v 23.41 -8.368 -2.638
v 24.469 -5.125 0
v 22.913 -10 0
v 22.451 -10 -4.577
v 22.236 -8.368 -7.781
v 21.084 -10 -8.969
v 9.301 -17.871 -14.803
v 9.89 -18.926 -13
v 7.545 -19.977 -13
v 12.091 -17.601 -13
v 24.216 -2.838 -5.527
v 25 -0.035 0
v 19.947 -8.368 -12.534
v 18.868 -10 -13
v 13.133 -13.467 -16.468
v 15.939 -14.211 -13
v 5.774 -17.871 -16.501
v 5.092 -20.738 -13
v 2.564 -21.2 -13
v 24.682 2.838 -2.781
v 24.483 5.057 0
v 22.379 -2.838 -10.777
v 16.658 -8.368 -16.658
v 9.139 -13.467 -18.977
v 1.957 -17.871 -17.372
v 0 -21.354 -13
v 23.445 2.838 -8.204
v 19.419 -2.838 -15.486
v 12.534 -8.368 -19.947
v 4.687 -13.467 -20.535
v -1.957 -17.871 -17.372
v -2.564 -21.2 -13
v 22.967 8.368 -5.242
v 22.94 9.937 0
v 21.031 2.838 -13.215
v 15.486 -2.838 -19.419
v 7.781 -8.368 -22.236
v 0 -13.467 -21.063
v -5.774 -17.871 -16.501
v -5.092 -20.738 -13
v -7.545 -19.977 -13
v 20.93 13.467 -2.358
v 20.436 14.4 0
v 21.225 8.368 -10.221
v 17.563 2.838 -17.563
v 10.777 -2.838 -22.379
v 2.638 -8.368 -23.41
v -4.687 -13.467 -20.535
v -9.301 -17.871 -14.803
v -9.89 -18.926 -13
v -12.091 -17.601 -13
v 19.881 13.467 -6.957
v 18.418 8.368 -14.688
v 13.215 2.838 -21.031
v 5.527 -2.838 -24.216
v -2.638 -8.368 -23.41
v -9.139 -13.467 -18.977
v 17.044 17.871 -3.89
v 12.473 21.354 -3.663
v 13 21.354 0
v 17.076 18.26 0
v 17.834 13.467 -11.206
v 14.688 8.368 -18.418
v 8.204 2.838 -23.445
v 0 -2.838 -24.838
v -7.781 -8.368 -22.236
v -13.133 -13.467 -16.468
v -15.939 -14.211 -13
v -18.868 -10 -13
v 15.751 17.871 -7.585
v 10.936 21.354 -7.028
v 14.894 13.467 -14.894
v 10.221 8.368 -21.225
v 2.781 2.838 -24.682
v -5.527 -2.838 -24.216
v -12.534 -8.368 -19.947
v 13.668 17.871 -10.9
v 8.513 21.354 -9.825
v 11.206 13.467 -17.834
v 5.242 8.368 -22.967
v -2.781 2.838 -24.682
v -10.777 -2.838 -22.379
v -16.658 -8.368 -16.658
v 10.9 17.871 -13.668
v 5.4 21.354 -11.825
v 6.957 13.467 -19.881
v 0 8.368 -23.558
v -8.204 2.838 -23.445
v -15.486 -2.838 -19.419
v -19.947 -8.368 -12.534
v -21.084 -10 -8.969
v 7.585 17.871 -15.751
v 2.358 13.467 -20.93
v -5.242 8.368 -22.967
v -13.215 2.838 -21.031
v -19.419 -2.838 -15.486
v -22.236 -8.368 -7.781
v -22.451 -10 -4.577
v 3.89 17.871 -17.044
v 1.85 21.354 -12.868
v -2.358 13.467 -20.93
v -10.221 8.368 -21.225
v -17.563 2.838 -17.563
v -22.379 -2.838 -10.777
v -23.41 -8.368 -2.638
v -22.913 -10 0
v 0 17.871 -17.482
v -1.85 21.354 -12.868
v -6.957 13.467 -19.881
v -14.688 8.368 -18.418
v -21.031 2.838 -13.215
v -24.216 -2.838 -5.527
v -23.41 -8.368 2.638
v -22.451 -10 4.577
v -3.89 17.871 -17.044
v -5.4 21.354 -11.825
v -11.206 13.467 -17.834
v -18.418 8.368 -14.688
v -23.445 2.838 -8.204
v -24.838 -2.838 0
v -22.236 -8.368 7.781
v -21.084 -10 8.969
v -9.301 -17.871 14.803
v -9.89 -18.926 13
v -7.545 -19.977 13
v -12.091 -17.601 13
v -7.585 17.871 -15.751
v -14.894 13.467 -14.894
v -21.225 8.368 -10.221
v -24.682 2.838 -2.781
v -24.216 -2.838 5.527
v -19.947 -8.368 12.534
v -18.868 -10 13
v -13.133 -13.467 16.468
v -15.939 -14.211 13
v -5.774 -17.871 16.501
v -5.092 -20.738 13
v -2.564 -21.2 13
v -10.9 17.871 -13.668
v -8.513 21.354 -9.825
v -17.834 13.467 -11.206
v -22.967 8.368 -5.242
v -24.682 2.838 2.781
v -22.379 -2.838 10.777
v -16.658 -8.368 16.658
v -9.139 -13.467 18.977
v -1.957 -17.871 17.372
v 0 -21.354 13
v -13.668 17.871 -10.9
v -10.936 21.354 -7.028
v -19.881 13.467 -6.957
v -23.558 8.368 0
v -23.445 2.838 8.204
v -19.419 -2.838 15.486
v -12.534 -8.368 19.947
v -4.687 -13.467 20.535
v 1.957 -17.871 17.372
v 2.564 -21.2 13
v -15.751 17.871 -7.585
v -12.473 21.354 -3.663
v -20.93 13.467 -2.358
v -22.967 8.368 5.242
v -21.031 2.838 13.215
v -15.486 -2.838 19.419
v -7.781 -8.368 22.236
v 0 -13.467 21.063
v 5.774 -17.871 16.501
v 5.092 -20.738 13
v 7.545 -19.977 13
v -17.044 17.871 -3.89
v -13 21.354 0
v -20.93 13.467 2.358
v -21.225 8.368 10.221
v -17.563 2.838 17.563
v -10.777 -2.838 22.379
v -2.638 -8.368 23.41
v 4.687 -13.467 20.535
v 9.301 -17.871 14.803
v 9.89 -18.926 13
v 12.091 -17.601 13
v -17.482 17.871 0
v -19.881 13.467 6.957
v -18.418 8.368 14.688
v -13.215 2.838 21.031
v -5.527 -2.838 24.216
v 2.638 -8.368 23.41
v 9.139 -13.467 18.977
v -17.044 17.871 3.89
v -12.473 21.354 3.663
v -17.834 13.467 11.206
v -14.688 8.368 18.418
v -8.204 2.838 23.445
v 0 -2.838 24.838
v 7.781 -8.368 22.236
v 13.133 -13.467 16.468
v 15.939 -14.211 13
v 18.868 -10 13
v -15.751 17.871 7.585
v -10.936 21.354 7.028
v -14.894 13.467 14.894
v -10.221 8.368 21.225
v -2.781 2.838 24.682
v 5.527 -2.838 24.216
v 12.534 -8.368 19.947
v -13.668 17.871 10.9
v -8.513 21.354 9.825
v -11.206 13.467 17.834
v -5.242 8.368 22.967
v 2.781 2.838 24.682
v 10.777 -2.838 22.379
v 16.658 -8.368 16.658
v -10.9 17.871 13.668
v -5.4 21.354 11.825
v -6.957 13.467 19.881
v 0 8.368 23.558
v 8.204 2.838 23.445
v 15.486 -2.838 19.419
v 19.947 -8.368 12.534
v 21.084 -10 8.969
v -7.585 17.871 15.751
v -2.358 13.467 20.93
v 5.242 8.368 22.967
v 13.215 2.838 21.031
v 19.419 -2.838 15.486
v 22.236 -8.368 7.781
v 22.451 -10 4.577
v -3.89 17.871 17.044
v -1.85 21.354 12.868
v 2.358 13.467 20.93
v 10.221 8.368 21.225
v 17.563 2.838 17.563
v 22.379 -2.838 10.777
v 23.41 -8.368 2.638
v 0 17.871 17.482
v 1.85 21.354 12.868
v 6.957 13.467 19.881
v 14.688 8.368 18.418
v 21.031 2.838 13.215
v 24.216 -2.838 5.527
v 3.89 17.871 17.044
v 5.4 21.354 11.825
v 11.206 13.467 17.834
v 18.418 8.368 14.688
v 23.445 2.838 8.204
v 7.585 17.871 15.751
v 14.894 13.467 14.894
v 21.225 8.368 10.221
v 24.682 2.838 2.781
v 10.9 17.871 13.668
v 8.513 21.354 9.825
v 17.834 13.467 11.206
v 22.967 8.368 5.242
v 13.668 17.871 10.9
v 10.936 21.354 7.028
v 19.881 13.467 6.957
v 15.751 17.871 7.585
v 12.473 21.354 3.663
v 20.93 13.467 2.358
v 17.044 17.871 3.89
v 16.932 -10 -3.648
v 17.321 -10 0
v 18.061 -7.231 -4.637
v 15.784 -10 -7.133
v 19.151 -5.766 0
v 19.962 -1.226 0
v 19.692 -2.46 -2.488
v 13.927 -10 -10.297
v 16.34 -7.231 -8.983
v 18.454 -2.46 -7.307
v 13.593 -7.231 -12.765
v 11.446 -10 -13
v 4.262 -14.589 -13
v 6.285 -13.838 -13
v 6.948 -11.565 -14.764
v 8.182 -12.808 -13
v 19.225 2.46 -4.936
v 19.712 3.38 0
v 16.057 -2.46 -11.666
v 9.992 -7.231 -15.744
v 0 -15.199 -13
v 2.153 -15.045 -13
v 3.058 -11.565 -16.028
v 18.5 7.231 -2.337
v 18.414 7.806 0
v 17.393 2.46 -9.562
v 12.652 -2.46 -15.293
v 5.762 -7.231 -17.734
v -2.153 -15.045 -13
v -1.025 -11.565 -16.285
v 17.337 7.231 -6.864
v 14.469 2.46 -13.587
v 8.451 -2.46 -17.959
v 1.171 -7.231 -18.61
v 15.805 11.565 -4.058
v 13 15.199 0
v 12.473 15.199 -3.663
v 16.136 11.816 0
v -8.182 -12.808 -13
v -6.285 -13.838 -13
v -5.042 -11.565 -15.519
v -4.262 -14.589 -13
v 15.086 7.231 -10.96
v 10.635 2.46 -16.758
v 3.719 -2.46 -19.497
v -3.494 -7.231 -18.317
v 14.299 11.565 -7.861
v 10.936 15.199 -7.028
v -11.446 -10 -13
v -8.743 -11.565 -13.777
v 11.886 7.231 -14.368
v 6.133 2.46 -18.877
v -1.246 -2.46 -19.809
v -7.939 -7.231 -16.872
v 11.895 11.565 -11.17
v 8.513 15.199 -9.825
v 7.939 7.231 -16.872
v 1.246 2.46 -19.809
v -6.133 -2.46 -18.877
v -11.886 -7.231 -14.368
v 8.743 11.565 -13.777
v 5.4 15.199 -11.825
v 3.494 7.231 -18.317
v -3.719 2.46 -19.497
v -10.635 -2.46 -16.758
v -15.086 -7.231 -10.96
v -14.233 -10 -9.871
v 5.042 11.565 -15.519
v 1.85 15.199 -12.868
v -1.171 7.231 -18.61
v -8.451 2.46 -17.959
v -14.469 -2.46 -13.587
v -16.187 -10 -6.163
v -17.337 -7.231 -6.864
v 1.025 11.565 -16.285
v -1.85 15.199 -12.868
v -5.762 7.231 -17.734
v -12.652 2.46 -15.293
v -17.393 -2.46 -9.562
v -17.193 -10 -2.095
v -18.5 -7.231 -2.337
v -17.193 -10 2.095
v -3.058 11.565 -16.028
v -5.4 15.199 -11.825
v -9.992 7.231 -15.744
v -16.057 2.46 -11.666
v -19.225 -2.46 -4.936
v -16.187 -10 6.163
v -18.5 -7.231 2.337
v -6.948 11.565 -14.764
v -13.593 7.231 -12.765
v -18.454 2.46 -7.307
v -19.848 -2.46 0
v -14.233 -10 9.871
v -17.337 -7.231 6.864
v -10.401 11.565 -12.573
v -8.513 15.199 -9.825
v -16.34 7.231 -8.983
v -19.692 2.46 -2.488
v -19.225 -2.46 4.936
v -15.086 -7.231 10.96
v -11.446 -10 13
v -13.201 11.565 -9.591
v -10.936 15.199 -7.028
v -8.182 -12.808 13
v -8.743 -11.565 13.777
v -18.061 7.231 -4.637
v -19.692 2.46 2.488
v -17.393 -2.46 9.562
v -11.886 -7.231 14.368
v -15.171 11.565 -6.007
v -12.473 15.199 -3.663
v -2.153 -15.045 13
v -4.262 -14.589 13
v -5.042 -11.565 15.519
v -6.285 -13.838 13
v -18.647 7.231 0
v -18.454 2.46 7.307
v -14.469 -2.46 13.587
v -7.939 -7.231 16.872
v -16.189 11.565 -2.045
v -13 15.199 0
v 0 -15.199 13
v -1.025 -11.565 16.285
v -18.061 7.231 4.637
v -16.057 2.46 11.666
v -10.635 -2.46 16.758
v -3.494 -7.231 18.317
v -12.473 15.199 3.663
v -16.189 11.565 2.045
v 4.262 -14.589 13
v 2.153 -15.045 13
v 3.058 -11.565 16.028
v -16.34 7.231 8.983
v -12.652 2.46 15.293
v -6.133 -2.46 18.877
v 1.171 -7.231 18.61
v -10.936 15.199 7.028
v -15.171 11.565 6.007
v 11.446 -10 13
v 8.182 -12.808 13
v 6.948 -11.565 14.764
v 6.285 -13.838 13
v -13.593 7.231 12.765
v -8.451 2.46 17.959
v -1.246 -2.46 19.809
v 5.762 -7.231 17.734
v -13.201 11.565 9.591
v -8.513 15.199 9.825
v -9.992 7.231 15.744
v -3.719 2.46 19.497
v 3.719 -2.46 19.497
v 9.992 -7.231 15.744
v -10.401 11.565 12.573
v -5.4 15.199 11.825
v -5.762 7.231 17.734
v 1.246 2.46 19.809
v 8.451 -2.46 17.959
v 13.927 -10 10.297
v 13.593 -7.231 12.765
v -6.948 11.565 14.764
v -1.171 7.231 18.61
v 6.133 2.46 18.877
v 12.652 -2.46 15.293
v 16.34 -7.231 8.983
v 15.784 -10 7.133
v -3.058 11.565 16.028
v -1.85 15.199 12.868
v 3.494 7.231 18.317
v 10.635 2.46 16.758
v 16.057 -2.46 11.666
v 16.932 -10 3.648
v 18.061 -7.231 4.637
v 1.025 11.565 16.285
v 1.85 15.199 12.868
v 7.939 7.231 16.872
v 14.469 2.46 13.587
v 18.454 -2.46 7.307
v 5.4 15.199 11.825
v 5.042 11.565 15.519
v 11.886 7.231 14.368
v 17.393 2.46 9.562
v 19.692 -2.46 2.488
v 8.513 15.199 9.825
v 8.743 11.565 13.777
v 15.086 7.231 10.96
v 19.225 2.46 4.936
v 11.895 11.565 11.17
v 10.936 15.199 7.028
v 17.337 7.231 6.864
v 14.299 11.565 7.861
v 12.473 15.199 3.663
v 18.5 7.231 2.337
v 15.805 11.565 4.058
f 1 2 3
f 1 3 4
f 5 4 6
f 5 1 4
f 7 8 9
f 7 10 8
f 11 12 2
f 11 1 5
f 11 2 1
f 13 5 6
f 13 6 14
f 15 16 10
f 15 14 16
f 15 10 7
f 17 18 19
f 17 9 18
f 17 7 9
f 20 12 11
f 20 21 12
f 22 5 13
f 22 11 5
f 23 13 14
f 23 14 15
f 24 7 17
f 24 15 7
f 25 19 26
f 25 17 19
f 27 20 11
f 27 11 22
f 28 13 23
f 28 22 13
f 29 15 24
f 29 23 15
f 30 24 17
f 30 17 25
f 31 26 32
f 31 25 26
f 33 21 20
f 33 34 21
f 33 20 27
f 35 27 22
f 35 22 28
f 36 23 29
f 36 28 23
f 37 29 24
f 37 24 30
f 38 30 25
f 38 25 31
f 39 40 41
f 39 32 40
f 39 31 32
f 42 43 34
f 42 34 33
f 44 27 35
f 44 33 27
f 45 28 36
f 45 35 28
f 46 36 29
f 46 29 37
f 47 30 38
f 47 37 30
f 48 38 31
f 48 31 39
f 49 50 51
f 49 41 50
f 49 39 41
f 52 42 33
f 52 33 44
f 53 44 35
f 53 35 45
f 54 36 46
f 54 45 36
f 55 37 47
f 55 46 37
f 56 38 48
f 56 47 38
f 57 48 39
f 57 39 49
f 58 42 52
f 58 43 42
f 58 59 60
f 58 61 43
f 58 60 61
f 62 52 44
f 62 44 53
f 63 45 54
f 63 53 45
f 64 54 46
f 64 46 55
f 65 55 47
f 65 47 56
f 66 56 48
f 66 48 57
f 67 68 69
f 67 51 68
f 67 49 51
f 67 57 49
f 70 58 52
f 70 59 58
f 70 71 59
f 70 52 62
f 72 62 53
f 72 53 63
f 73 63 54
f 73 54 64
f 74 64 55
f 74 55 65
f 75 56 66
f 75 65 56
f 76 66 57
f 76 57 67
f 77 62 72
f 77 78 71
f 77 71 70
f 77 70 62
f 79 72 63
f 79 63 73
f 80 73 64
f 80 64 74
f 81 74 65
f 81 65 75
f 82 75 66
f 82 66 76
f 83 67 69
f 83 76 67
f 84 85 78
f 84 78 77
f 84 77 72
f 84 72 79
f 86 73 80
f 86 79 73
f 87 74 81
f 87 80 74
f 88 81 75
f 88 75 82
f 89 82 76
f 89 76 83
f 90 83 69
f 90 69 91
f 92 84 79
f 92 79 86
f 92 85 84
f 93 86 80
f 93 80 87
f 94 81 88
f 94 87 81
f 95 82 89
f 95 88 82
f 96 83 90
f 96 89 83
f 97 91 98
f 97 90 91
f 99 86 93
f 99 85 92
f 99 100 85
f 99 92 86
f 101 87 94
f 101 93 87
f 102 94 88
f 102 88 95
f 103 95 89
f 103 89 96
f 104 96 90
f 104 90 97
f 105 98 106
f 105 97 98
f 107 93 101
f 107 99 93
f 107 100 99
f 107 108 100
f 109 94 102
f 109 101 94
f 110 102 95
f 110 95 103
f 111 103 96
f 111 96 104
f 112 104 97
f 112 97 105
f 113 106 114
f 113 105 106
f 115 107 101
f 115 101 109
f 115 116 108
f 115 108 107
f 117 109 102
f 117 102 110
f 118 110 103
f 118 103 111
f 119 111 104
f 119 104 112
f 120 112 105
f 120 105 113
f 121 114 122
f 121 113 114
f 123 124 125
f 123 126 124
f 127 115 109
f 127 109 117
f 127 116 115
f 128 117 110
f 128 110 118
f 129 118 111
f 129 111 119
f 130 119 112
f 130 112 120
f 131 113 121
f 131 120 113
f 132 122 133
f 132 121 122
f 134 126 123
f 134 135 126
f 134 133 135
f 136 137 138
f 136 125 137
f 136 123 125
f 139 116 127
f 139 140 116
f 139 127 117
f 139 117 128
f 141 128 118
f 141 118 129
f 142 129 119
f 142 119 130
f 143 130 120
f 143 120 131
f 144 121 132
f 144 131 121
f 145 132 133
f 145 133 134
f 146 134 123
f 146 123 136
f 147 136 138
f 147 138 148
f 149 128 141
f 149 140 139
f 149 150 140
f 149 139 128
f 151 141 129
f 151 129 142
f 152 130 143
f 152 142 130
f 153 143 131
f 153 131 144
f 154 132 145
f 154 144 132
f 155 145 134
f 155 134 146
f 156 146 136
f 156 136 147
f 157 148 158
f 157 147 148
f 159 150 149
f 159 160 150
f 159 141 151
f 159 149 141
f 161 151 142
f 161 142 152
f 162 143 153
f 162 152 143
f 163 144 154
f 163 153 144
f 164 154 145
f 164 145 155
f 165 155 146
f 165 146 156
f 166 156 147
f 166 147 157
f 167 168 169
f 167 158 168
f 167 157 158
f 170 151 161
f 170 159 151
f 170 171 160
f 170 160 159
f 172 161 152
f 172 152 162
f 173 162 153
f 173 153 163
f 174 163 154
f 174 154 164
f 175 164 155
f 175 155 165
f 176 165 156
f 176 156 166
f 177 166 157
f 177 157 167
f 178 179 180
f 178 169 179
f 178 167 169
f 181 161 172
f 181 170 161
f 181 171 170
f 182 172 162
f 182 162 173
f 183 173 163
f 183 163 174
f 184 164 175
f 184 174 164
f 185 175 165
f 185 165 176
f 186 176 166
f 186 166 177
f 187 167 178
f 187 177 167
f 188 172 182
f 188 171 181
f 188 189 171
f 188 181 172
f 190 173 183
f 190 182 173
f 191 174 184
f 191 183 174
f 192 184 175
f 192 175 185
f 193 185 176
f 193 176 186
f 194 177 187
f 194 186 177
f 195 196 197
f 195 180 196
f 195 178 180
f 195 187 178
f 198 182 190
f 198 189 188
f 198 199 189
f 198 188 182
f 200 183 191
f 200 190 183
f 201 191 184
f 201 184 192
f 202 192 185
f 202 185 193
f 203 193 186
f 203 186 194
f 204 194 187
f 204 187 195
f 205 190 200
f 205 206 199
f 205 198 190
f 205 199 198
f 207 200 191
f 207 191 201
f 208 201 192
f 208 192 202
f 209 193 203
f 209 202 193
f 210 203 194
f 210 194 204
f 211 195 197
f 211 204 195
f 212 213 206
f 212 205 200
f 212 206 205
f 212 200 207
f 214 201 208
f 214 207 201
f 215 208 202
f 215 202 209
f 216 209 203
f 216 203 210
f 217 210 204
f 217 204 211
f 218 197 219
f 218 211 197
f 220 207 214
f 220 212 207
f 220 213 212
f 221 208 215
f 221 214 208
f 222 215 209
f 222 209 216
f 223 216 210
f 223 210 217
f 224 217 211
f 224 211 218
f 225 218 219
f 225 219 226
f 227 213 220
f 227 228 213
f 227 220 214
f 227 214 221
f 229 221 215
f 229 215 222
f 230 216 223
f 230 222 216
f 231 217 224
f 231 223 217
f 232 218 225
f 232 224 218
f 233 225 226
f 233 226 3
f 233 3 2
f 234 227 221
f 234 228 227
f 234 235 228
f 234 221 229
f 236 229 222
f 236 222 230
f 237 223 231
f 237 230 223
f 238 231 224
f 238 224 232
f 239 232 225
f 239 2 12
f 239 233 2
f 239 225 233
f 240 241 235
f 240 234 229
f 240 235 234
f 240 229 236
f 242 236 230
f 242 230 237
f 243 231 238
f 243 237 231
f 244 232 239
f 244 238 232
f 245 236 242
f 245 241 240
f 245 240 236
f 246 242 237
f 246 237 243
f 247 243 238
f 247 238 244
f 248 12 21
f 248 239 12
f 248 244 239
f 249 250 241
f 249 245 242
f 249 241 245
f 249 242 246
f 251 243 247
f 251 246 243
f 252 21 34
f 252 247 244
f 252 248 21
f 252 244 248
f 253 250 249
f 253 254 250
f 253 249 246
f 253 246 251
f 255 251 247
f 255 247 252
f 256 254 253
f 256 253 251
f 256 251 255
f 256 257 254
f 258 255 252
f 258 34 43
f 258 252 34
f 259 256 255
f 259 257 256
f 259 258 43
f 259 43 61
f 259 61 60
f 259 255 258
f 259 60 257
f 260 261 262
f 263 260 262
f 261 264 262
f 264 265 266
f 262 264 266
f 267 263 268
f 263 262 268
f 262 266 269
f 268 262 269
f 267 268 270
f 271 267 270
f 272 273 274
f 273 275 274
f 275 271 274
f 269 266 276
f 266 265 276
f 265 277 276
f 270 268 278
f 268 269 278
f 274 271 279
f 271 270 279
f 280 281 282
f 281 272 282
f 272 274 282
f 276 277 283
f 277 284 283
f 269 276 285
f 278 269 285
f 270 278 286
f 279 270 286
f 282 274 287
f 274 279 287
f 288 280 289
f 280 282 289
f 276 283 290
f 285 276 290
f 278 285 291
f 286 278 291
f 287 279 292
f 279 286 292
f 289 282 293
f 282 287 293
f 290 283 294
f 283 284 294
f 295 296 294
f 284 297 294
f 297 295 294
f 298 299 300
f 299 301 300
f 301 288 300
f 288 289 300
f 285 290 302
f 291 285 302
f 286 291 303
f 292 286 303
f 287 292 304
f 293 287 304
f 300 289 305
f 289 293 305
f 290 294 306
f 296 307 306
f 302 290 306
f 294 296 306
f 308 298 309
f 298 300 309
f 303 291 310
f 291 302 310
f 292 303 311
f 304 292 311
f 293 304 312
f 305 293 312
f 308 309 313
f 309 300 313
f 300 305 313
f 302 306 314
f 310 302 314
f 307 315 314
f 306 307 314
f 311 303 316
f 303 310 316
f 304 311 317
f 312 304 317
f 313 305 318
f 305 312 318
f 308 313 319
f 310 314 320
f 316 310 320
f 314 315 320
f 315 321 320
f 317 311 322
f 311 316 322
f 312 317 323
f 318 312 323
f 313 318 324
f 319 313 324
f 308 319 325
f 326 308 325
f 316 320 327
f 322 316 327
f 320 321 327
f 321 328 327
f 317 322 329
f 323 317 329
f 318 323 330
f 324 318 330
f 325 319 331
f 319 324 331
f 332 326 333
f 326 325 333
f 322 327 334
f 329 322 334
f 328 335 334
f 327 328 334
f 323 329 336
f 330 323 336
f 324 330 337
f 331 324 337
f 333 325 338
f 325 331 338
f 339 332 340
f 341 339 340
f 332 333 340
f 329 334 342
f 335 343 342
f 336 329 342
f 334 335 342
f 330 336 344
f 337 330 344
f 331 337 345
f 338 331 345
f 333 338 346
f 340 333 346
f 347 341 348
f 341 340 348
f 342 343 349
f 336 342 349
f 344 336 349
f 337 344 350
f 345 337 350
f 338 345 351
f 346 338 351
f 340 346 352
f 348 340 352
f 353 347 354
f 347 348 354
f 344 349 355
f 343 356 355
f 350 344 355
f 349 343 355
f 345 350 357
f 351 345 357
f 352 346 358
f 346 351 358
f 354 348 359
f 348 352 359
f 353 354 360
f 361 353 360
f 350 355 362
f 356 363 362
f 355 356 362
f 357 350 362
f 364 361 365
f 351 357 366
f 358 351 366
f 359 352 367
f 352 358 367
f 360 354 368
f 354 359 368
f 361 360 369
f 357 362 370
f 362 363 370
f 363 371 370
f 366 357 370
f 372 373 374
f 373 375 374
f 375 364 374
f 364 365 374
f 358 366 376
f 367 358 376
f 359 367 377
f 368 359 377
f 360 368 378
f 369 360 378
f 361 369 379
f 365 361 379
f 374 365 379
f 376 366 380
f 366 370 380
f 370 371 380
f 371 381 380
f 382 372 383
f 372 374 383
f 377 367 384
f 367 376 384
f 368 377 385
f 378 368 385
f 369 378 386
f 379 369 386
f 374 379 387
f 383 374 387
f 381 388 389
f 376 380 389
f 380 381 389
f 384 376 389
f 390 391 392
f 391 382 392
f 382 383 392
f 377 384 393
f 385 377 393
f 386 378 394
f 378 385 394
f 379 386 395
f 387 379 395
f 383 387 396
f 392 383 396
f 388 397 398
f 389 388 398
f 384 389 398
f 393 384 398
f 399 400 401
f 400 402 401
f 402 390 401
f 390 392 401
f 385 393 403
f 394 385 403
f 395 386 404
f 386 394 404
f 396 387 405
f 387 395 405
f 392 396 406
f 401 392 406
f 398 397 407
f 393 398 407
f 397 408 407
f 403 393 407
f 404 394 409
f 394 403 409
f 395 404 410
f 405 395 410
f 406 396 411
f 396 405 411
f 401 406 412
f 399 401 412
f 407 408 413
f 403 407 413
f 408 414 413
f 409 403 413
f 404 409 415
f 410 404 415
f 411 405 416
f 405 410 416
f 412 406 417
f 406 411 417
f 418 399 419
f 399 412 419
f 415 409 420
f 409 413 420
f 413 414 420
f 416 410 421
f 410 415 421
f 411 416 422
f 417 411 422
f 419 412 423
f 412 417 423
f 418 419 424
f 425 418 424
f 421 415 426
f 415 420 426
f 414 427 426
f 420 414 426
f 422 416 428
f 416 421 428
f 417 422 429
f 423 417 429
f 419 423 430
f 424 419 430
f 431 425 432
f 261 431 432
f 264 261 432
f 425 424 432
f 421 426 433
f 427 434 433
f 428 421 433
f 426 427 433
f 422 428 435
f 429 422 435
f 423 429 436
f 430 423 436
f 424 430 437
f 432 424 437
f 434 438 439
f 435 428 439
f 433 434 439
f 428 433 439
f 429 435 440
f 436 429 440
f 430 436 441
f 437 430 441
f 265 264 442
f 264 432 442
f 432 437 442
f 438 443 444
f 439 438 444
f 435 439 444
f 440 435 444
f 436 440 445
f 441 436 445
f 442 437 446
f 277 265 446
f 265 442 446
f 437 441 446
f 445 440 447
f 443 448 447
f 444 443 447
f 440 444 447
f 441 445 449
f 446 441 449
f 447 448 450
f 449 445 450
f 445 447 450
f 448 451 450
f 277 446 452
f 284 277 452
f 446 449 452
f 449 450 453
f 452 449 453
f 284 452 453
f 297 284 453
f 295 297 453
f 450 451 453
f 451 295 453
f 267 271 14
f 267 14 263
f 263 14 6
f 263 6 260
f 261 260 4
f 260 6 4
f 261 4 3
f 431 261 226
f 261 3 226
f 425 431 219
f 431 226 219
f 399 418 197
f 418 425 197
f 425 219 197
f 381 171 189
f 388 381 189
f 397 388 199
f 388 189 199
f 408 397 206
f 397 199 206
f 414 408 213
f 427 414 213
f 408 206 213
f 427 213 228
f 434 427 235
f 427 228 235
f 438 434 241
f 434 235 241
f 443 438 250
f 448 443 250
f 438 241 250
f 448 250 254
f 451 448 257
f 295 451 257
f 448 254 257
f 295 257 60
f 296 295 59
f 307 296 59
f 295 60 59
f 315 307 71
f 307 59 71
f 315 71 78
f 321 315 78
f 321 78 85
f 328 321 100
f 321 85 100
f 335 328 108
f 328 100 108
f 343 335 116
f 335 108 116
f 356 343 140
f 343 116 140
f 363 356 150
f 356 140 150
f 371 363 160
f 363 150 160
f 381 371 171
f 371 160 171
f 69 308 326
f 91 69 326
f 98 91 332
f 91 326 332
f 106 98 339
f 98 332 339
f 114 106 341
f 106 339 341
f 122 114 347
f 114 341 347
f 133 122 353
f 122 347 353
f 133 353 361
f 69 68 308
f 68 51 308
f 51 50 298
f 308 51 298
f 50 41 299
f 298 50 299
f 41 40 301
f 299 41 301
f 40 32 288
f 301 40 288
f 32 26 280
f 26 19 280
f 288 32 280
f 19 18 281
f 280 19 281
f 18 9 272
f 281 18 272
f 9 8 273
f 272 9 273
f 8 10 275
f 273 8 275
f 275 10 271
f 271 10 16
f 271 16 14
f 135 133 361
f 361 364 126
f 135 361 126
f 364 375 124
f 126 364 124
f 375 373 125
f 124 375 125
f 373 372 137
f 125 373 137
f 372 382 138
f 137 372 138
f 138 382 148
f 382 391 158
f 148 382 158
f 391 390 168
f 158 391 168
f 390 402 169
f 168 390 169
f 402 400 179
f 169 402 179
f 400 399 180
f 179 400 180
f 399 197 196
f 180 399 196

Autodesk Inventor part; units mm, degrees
ref_plane "XY Plane" through (0, 0, 0) normal (0, 0, 1) x (1, 0, 0)
sketch "Эскиз1" plane through (0, 0, 0) normal (0, 0, 1) x (1, 0, 0)
  arc A0 (0, -25) -> (0, 25) centre (0, 0) ccw
  arc A1 (0, -20) -> (0, 20) centre (0, 0) ccw
  line L0 (0, 25) -> (0, 20)
  line L1 (0, -25) -> (0, -20)
revolve "Вращение1" add sketch "Эскиз1" angle 360 about axis through (0, -25, 0) along (0, 1, 0)
ref_plane "РабПлоскость1" through (0, 50, 0) normal (0, 1, 0) x (-1, 0, 0)
sketch "Эскиз2" plane through (0, 50, 0) normal (0, 1, 0) x (-1, 0, 0)
  circle A0 centre (0, 0) radius 13
  dimension "d4" = 26
extrude "Выдавливание1" cut sketch "Эскиз2" against normal blind 100
ref_plane "РабПлоскость2" through (25, 0, 0) normal (1, 0, 0) x (0, 1, 0)
sketch "Эскиз3" plane through (25, 0, 0) normal (1, 0, 0) x (0, 1, 0)
  line L0 (-10, 13) -> (-29.0962, 13)
  line L1 (-29.0962, 13) -> (-29.0962, -13)
  line L2 (-29.0962, -13) -> (-10, -13)
  line L3 (-10, -13) -> (-10, 13)
  point P0 (0, 0)
extrude "Выдавливание2" cut sketch "Эскиз3" against normal blind 100
properties part number "шар"
